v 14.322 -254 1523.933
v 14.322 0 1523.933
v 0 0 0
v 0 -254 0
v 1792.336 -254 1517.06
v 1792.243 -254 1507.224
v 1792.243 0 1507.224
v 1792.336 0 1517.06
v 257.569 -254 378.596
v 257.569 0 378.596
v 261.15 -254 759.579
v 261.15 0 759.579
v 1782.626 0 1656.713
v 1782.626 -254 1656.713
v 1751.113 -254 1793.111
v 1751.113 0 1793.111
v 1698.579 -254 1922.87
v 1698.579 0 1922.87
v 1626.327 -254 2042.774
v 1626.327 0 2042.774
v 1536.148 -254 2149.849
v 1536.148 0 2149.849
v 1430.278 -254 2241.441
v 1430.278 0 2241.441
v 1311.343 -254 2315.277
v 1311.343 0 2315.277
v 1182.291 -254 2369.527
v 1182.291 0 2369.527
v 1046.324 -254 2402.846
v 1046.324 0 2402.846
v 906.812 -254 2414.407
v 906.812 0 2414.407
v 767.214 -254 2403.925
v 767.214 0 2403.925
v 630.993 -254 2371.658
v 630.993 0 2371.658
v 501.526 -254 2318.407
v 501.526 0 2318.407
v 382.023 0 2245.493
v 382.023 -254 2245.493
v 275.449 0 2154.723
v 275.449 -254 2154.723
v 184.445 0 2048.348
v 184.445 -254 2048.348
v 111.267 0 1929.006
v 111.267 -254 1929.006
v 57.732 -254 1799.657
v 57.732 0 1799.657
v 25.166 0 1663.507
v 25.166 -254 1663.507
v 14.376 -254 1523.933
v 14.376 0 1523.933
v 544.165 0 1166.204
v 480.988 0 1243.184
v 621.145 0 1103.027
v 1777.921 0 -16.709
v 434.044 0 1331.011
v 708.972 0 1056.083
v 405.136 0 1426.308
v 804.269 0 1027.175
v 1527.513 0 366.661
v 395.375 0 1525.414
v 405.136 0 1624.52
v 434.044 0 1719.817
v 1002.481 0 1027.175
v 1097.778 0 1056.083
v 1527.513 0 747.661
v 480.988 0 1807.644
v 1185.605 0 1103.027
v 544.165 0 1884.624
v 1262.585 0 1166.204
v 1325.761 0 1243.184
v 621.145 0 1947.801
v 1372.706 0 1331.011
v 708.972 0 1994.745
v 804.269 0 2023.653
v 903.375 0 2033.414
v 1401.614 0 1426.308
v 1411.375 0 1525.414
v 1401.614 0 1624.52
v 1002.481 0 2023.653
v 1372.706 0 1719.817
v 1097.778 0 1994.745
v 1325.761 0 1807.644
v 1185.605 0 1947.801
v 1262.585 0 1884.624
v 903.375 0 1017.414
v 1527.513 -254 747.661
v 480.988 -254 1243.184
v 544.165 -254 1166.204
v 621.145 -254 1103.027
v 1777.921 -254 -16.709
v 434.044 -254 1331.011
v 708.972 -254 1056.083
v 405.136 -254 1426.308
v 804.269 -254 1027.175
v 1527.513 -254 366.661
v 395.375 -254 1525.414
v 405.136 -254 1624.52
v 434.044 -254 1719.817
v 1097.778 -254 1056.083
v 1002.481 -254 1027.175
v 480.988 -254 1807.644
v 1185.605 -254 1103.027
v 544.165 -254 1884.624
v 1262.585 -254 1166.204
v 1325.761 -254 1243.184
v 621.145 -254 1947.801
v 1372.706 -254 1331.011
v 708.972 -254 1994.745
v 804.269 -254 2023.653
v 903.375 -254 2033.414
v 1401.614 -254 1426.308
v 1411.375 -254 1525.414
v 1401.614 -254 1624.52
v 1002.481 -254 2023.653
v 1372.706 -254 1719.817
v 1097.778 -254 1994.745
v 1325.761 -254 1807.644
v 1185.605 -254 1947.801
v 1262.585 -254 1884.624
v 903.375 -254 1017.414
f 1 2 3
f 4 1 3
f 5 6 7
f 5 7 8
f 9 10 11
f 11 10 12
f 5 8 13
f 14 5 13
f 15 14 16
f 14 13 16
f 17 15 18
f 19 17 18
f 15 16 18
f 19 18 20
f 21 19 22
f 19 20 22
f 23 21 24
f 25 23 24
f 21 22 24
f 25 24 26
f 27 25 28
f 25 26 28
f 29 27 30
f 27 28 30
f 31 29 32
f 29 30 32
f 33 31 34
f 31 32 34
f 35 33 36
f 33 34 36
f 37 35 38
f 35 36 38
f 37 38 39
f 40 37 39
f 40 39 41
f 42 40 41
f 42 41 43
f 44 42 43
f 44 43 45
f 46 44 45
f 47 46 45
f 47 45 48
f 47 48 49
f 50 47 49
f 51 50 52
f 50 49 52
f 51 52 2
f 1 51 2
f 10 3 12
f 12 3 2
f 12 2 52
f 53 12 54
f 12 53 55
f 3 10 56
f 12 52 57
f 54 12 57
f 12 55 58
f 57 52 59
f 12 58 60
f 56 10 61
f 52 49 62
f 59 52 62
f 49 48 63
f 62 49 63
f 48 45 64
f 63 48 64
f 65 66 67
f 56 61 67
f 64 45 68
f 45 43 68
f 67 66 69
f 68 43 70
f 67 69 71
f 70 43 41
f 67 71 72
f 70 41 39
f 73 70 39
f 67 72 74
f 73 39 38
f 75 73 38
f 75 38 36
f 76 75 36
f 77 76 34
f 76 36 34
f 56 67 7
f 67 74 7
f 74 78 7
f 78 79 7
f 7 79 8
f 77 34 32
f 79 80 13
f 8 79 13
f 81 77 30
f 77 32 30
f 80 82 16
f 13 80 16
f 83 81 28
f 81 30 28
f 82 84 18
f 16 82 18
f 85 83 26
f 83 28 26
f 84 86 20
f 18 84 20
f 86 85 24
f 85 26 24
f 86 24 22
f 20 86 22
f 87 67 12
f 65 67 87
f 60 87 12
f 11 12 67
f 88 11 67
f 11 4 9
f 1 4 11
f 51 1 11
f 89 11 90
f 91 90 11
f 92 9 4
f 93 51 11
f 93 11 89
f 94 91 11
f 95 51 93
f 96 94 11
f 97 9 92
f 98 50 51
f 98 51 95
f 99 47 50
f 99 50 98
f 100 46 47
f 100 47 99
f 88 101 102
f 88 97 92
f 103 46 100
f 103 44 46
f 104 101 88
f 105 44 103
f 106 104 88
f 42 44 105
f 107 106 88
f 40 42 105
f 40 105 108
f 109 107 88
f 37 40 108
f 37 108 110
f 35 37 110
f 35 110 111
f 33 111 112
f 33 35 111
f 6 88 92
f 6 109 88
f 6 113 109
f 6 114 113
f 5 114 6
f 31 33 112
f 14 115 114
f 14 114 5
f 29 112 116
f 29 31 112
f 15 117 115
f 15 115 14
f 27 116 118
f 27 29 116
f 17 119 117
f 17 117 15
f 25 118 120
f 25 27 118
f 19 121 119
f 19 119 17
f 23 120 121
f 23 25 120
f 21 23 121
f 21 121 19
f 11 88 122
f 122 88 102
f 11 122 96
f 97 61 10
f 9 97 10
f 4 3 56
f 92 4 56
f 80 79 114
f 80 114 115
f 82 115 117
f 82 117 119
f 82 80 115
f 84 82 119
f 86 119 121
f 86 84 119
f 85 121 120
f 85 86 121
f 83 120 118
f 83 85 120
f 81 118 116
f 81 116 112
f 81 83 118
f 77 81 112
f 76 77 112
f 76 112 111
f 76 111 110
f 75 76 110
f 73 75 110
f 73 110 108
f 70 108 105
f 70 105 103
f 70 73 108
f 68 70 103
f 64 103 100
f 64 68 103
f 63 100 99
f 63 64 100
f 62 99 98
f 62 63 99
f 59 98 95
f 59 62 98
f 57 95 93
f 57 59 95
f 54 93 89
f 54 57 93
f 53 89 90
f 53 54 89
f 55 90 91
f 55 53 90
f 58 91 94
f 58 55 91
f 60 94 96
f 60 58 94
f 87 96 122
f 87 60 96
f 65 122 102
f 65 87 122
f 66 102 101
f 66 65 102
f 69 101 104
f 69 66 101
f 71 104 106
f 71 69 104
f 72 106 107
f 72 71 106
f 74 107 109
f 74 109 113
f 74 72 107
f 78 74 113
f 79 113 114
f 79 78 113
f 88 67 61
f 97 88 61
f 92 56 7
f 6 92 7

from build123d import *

# Parameters (mm, degrees)
F0_R     = 508
F1_DEPTH = 254


with BuildPart() as f1:
    # F0 (on Front) → F1 (new body)
    with BuildSketch(Plane.XZ):
        with BuildLine():
            Line((14.321755, 1523.932704), (0, 0))
            Line((0, 0), (1777.921488, -16.708714))
            Line((1777.921488, -16.708714), (1792.243243, 1507.22399))
            Line((1792.243243, 1507.22399), (1792.335678, 1517.059666))
            ThreePointArc((1792.335678, 1517.059666), (906.811505, 2414.407381), (14.376168, 1523.932704))
            Line((14.376168, 1523.932704), (14.321755, 1523.932704))
        make_face()
        Polygon((257.569223, 378.596217), (261.149661, 759.579393), (1527.513143, 747.661421), (1527.513143, 366.661421), align=None, mode=Mode.SUBTRACT)
        with Locations((903.374934, 1525.414023)):
            Circle(F0_R, mode=Mode.SUBTRACT)
    extrude(amount=F1_DEPTH)


solid = f1.part
